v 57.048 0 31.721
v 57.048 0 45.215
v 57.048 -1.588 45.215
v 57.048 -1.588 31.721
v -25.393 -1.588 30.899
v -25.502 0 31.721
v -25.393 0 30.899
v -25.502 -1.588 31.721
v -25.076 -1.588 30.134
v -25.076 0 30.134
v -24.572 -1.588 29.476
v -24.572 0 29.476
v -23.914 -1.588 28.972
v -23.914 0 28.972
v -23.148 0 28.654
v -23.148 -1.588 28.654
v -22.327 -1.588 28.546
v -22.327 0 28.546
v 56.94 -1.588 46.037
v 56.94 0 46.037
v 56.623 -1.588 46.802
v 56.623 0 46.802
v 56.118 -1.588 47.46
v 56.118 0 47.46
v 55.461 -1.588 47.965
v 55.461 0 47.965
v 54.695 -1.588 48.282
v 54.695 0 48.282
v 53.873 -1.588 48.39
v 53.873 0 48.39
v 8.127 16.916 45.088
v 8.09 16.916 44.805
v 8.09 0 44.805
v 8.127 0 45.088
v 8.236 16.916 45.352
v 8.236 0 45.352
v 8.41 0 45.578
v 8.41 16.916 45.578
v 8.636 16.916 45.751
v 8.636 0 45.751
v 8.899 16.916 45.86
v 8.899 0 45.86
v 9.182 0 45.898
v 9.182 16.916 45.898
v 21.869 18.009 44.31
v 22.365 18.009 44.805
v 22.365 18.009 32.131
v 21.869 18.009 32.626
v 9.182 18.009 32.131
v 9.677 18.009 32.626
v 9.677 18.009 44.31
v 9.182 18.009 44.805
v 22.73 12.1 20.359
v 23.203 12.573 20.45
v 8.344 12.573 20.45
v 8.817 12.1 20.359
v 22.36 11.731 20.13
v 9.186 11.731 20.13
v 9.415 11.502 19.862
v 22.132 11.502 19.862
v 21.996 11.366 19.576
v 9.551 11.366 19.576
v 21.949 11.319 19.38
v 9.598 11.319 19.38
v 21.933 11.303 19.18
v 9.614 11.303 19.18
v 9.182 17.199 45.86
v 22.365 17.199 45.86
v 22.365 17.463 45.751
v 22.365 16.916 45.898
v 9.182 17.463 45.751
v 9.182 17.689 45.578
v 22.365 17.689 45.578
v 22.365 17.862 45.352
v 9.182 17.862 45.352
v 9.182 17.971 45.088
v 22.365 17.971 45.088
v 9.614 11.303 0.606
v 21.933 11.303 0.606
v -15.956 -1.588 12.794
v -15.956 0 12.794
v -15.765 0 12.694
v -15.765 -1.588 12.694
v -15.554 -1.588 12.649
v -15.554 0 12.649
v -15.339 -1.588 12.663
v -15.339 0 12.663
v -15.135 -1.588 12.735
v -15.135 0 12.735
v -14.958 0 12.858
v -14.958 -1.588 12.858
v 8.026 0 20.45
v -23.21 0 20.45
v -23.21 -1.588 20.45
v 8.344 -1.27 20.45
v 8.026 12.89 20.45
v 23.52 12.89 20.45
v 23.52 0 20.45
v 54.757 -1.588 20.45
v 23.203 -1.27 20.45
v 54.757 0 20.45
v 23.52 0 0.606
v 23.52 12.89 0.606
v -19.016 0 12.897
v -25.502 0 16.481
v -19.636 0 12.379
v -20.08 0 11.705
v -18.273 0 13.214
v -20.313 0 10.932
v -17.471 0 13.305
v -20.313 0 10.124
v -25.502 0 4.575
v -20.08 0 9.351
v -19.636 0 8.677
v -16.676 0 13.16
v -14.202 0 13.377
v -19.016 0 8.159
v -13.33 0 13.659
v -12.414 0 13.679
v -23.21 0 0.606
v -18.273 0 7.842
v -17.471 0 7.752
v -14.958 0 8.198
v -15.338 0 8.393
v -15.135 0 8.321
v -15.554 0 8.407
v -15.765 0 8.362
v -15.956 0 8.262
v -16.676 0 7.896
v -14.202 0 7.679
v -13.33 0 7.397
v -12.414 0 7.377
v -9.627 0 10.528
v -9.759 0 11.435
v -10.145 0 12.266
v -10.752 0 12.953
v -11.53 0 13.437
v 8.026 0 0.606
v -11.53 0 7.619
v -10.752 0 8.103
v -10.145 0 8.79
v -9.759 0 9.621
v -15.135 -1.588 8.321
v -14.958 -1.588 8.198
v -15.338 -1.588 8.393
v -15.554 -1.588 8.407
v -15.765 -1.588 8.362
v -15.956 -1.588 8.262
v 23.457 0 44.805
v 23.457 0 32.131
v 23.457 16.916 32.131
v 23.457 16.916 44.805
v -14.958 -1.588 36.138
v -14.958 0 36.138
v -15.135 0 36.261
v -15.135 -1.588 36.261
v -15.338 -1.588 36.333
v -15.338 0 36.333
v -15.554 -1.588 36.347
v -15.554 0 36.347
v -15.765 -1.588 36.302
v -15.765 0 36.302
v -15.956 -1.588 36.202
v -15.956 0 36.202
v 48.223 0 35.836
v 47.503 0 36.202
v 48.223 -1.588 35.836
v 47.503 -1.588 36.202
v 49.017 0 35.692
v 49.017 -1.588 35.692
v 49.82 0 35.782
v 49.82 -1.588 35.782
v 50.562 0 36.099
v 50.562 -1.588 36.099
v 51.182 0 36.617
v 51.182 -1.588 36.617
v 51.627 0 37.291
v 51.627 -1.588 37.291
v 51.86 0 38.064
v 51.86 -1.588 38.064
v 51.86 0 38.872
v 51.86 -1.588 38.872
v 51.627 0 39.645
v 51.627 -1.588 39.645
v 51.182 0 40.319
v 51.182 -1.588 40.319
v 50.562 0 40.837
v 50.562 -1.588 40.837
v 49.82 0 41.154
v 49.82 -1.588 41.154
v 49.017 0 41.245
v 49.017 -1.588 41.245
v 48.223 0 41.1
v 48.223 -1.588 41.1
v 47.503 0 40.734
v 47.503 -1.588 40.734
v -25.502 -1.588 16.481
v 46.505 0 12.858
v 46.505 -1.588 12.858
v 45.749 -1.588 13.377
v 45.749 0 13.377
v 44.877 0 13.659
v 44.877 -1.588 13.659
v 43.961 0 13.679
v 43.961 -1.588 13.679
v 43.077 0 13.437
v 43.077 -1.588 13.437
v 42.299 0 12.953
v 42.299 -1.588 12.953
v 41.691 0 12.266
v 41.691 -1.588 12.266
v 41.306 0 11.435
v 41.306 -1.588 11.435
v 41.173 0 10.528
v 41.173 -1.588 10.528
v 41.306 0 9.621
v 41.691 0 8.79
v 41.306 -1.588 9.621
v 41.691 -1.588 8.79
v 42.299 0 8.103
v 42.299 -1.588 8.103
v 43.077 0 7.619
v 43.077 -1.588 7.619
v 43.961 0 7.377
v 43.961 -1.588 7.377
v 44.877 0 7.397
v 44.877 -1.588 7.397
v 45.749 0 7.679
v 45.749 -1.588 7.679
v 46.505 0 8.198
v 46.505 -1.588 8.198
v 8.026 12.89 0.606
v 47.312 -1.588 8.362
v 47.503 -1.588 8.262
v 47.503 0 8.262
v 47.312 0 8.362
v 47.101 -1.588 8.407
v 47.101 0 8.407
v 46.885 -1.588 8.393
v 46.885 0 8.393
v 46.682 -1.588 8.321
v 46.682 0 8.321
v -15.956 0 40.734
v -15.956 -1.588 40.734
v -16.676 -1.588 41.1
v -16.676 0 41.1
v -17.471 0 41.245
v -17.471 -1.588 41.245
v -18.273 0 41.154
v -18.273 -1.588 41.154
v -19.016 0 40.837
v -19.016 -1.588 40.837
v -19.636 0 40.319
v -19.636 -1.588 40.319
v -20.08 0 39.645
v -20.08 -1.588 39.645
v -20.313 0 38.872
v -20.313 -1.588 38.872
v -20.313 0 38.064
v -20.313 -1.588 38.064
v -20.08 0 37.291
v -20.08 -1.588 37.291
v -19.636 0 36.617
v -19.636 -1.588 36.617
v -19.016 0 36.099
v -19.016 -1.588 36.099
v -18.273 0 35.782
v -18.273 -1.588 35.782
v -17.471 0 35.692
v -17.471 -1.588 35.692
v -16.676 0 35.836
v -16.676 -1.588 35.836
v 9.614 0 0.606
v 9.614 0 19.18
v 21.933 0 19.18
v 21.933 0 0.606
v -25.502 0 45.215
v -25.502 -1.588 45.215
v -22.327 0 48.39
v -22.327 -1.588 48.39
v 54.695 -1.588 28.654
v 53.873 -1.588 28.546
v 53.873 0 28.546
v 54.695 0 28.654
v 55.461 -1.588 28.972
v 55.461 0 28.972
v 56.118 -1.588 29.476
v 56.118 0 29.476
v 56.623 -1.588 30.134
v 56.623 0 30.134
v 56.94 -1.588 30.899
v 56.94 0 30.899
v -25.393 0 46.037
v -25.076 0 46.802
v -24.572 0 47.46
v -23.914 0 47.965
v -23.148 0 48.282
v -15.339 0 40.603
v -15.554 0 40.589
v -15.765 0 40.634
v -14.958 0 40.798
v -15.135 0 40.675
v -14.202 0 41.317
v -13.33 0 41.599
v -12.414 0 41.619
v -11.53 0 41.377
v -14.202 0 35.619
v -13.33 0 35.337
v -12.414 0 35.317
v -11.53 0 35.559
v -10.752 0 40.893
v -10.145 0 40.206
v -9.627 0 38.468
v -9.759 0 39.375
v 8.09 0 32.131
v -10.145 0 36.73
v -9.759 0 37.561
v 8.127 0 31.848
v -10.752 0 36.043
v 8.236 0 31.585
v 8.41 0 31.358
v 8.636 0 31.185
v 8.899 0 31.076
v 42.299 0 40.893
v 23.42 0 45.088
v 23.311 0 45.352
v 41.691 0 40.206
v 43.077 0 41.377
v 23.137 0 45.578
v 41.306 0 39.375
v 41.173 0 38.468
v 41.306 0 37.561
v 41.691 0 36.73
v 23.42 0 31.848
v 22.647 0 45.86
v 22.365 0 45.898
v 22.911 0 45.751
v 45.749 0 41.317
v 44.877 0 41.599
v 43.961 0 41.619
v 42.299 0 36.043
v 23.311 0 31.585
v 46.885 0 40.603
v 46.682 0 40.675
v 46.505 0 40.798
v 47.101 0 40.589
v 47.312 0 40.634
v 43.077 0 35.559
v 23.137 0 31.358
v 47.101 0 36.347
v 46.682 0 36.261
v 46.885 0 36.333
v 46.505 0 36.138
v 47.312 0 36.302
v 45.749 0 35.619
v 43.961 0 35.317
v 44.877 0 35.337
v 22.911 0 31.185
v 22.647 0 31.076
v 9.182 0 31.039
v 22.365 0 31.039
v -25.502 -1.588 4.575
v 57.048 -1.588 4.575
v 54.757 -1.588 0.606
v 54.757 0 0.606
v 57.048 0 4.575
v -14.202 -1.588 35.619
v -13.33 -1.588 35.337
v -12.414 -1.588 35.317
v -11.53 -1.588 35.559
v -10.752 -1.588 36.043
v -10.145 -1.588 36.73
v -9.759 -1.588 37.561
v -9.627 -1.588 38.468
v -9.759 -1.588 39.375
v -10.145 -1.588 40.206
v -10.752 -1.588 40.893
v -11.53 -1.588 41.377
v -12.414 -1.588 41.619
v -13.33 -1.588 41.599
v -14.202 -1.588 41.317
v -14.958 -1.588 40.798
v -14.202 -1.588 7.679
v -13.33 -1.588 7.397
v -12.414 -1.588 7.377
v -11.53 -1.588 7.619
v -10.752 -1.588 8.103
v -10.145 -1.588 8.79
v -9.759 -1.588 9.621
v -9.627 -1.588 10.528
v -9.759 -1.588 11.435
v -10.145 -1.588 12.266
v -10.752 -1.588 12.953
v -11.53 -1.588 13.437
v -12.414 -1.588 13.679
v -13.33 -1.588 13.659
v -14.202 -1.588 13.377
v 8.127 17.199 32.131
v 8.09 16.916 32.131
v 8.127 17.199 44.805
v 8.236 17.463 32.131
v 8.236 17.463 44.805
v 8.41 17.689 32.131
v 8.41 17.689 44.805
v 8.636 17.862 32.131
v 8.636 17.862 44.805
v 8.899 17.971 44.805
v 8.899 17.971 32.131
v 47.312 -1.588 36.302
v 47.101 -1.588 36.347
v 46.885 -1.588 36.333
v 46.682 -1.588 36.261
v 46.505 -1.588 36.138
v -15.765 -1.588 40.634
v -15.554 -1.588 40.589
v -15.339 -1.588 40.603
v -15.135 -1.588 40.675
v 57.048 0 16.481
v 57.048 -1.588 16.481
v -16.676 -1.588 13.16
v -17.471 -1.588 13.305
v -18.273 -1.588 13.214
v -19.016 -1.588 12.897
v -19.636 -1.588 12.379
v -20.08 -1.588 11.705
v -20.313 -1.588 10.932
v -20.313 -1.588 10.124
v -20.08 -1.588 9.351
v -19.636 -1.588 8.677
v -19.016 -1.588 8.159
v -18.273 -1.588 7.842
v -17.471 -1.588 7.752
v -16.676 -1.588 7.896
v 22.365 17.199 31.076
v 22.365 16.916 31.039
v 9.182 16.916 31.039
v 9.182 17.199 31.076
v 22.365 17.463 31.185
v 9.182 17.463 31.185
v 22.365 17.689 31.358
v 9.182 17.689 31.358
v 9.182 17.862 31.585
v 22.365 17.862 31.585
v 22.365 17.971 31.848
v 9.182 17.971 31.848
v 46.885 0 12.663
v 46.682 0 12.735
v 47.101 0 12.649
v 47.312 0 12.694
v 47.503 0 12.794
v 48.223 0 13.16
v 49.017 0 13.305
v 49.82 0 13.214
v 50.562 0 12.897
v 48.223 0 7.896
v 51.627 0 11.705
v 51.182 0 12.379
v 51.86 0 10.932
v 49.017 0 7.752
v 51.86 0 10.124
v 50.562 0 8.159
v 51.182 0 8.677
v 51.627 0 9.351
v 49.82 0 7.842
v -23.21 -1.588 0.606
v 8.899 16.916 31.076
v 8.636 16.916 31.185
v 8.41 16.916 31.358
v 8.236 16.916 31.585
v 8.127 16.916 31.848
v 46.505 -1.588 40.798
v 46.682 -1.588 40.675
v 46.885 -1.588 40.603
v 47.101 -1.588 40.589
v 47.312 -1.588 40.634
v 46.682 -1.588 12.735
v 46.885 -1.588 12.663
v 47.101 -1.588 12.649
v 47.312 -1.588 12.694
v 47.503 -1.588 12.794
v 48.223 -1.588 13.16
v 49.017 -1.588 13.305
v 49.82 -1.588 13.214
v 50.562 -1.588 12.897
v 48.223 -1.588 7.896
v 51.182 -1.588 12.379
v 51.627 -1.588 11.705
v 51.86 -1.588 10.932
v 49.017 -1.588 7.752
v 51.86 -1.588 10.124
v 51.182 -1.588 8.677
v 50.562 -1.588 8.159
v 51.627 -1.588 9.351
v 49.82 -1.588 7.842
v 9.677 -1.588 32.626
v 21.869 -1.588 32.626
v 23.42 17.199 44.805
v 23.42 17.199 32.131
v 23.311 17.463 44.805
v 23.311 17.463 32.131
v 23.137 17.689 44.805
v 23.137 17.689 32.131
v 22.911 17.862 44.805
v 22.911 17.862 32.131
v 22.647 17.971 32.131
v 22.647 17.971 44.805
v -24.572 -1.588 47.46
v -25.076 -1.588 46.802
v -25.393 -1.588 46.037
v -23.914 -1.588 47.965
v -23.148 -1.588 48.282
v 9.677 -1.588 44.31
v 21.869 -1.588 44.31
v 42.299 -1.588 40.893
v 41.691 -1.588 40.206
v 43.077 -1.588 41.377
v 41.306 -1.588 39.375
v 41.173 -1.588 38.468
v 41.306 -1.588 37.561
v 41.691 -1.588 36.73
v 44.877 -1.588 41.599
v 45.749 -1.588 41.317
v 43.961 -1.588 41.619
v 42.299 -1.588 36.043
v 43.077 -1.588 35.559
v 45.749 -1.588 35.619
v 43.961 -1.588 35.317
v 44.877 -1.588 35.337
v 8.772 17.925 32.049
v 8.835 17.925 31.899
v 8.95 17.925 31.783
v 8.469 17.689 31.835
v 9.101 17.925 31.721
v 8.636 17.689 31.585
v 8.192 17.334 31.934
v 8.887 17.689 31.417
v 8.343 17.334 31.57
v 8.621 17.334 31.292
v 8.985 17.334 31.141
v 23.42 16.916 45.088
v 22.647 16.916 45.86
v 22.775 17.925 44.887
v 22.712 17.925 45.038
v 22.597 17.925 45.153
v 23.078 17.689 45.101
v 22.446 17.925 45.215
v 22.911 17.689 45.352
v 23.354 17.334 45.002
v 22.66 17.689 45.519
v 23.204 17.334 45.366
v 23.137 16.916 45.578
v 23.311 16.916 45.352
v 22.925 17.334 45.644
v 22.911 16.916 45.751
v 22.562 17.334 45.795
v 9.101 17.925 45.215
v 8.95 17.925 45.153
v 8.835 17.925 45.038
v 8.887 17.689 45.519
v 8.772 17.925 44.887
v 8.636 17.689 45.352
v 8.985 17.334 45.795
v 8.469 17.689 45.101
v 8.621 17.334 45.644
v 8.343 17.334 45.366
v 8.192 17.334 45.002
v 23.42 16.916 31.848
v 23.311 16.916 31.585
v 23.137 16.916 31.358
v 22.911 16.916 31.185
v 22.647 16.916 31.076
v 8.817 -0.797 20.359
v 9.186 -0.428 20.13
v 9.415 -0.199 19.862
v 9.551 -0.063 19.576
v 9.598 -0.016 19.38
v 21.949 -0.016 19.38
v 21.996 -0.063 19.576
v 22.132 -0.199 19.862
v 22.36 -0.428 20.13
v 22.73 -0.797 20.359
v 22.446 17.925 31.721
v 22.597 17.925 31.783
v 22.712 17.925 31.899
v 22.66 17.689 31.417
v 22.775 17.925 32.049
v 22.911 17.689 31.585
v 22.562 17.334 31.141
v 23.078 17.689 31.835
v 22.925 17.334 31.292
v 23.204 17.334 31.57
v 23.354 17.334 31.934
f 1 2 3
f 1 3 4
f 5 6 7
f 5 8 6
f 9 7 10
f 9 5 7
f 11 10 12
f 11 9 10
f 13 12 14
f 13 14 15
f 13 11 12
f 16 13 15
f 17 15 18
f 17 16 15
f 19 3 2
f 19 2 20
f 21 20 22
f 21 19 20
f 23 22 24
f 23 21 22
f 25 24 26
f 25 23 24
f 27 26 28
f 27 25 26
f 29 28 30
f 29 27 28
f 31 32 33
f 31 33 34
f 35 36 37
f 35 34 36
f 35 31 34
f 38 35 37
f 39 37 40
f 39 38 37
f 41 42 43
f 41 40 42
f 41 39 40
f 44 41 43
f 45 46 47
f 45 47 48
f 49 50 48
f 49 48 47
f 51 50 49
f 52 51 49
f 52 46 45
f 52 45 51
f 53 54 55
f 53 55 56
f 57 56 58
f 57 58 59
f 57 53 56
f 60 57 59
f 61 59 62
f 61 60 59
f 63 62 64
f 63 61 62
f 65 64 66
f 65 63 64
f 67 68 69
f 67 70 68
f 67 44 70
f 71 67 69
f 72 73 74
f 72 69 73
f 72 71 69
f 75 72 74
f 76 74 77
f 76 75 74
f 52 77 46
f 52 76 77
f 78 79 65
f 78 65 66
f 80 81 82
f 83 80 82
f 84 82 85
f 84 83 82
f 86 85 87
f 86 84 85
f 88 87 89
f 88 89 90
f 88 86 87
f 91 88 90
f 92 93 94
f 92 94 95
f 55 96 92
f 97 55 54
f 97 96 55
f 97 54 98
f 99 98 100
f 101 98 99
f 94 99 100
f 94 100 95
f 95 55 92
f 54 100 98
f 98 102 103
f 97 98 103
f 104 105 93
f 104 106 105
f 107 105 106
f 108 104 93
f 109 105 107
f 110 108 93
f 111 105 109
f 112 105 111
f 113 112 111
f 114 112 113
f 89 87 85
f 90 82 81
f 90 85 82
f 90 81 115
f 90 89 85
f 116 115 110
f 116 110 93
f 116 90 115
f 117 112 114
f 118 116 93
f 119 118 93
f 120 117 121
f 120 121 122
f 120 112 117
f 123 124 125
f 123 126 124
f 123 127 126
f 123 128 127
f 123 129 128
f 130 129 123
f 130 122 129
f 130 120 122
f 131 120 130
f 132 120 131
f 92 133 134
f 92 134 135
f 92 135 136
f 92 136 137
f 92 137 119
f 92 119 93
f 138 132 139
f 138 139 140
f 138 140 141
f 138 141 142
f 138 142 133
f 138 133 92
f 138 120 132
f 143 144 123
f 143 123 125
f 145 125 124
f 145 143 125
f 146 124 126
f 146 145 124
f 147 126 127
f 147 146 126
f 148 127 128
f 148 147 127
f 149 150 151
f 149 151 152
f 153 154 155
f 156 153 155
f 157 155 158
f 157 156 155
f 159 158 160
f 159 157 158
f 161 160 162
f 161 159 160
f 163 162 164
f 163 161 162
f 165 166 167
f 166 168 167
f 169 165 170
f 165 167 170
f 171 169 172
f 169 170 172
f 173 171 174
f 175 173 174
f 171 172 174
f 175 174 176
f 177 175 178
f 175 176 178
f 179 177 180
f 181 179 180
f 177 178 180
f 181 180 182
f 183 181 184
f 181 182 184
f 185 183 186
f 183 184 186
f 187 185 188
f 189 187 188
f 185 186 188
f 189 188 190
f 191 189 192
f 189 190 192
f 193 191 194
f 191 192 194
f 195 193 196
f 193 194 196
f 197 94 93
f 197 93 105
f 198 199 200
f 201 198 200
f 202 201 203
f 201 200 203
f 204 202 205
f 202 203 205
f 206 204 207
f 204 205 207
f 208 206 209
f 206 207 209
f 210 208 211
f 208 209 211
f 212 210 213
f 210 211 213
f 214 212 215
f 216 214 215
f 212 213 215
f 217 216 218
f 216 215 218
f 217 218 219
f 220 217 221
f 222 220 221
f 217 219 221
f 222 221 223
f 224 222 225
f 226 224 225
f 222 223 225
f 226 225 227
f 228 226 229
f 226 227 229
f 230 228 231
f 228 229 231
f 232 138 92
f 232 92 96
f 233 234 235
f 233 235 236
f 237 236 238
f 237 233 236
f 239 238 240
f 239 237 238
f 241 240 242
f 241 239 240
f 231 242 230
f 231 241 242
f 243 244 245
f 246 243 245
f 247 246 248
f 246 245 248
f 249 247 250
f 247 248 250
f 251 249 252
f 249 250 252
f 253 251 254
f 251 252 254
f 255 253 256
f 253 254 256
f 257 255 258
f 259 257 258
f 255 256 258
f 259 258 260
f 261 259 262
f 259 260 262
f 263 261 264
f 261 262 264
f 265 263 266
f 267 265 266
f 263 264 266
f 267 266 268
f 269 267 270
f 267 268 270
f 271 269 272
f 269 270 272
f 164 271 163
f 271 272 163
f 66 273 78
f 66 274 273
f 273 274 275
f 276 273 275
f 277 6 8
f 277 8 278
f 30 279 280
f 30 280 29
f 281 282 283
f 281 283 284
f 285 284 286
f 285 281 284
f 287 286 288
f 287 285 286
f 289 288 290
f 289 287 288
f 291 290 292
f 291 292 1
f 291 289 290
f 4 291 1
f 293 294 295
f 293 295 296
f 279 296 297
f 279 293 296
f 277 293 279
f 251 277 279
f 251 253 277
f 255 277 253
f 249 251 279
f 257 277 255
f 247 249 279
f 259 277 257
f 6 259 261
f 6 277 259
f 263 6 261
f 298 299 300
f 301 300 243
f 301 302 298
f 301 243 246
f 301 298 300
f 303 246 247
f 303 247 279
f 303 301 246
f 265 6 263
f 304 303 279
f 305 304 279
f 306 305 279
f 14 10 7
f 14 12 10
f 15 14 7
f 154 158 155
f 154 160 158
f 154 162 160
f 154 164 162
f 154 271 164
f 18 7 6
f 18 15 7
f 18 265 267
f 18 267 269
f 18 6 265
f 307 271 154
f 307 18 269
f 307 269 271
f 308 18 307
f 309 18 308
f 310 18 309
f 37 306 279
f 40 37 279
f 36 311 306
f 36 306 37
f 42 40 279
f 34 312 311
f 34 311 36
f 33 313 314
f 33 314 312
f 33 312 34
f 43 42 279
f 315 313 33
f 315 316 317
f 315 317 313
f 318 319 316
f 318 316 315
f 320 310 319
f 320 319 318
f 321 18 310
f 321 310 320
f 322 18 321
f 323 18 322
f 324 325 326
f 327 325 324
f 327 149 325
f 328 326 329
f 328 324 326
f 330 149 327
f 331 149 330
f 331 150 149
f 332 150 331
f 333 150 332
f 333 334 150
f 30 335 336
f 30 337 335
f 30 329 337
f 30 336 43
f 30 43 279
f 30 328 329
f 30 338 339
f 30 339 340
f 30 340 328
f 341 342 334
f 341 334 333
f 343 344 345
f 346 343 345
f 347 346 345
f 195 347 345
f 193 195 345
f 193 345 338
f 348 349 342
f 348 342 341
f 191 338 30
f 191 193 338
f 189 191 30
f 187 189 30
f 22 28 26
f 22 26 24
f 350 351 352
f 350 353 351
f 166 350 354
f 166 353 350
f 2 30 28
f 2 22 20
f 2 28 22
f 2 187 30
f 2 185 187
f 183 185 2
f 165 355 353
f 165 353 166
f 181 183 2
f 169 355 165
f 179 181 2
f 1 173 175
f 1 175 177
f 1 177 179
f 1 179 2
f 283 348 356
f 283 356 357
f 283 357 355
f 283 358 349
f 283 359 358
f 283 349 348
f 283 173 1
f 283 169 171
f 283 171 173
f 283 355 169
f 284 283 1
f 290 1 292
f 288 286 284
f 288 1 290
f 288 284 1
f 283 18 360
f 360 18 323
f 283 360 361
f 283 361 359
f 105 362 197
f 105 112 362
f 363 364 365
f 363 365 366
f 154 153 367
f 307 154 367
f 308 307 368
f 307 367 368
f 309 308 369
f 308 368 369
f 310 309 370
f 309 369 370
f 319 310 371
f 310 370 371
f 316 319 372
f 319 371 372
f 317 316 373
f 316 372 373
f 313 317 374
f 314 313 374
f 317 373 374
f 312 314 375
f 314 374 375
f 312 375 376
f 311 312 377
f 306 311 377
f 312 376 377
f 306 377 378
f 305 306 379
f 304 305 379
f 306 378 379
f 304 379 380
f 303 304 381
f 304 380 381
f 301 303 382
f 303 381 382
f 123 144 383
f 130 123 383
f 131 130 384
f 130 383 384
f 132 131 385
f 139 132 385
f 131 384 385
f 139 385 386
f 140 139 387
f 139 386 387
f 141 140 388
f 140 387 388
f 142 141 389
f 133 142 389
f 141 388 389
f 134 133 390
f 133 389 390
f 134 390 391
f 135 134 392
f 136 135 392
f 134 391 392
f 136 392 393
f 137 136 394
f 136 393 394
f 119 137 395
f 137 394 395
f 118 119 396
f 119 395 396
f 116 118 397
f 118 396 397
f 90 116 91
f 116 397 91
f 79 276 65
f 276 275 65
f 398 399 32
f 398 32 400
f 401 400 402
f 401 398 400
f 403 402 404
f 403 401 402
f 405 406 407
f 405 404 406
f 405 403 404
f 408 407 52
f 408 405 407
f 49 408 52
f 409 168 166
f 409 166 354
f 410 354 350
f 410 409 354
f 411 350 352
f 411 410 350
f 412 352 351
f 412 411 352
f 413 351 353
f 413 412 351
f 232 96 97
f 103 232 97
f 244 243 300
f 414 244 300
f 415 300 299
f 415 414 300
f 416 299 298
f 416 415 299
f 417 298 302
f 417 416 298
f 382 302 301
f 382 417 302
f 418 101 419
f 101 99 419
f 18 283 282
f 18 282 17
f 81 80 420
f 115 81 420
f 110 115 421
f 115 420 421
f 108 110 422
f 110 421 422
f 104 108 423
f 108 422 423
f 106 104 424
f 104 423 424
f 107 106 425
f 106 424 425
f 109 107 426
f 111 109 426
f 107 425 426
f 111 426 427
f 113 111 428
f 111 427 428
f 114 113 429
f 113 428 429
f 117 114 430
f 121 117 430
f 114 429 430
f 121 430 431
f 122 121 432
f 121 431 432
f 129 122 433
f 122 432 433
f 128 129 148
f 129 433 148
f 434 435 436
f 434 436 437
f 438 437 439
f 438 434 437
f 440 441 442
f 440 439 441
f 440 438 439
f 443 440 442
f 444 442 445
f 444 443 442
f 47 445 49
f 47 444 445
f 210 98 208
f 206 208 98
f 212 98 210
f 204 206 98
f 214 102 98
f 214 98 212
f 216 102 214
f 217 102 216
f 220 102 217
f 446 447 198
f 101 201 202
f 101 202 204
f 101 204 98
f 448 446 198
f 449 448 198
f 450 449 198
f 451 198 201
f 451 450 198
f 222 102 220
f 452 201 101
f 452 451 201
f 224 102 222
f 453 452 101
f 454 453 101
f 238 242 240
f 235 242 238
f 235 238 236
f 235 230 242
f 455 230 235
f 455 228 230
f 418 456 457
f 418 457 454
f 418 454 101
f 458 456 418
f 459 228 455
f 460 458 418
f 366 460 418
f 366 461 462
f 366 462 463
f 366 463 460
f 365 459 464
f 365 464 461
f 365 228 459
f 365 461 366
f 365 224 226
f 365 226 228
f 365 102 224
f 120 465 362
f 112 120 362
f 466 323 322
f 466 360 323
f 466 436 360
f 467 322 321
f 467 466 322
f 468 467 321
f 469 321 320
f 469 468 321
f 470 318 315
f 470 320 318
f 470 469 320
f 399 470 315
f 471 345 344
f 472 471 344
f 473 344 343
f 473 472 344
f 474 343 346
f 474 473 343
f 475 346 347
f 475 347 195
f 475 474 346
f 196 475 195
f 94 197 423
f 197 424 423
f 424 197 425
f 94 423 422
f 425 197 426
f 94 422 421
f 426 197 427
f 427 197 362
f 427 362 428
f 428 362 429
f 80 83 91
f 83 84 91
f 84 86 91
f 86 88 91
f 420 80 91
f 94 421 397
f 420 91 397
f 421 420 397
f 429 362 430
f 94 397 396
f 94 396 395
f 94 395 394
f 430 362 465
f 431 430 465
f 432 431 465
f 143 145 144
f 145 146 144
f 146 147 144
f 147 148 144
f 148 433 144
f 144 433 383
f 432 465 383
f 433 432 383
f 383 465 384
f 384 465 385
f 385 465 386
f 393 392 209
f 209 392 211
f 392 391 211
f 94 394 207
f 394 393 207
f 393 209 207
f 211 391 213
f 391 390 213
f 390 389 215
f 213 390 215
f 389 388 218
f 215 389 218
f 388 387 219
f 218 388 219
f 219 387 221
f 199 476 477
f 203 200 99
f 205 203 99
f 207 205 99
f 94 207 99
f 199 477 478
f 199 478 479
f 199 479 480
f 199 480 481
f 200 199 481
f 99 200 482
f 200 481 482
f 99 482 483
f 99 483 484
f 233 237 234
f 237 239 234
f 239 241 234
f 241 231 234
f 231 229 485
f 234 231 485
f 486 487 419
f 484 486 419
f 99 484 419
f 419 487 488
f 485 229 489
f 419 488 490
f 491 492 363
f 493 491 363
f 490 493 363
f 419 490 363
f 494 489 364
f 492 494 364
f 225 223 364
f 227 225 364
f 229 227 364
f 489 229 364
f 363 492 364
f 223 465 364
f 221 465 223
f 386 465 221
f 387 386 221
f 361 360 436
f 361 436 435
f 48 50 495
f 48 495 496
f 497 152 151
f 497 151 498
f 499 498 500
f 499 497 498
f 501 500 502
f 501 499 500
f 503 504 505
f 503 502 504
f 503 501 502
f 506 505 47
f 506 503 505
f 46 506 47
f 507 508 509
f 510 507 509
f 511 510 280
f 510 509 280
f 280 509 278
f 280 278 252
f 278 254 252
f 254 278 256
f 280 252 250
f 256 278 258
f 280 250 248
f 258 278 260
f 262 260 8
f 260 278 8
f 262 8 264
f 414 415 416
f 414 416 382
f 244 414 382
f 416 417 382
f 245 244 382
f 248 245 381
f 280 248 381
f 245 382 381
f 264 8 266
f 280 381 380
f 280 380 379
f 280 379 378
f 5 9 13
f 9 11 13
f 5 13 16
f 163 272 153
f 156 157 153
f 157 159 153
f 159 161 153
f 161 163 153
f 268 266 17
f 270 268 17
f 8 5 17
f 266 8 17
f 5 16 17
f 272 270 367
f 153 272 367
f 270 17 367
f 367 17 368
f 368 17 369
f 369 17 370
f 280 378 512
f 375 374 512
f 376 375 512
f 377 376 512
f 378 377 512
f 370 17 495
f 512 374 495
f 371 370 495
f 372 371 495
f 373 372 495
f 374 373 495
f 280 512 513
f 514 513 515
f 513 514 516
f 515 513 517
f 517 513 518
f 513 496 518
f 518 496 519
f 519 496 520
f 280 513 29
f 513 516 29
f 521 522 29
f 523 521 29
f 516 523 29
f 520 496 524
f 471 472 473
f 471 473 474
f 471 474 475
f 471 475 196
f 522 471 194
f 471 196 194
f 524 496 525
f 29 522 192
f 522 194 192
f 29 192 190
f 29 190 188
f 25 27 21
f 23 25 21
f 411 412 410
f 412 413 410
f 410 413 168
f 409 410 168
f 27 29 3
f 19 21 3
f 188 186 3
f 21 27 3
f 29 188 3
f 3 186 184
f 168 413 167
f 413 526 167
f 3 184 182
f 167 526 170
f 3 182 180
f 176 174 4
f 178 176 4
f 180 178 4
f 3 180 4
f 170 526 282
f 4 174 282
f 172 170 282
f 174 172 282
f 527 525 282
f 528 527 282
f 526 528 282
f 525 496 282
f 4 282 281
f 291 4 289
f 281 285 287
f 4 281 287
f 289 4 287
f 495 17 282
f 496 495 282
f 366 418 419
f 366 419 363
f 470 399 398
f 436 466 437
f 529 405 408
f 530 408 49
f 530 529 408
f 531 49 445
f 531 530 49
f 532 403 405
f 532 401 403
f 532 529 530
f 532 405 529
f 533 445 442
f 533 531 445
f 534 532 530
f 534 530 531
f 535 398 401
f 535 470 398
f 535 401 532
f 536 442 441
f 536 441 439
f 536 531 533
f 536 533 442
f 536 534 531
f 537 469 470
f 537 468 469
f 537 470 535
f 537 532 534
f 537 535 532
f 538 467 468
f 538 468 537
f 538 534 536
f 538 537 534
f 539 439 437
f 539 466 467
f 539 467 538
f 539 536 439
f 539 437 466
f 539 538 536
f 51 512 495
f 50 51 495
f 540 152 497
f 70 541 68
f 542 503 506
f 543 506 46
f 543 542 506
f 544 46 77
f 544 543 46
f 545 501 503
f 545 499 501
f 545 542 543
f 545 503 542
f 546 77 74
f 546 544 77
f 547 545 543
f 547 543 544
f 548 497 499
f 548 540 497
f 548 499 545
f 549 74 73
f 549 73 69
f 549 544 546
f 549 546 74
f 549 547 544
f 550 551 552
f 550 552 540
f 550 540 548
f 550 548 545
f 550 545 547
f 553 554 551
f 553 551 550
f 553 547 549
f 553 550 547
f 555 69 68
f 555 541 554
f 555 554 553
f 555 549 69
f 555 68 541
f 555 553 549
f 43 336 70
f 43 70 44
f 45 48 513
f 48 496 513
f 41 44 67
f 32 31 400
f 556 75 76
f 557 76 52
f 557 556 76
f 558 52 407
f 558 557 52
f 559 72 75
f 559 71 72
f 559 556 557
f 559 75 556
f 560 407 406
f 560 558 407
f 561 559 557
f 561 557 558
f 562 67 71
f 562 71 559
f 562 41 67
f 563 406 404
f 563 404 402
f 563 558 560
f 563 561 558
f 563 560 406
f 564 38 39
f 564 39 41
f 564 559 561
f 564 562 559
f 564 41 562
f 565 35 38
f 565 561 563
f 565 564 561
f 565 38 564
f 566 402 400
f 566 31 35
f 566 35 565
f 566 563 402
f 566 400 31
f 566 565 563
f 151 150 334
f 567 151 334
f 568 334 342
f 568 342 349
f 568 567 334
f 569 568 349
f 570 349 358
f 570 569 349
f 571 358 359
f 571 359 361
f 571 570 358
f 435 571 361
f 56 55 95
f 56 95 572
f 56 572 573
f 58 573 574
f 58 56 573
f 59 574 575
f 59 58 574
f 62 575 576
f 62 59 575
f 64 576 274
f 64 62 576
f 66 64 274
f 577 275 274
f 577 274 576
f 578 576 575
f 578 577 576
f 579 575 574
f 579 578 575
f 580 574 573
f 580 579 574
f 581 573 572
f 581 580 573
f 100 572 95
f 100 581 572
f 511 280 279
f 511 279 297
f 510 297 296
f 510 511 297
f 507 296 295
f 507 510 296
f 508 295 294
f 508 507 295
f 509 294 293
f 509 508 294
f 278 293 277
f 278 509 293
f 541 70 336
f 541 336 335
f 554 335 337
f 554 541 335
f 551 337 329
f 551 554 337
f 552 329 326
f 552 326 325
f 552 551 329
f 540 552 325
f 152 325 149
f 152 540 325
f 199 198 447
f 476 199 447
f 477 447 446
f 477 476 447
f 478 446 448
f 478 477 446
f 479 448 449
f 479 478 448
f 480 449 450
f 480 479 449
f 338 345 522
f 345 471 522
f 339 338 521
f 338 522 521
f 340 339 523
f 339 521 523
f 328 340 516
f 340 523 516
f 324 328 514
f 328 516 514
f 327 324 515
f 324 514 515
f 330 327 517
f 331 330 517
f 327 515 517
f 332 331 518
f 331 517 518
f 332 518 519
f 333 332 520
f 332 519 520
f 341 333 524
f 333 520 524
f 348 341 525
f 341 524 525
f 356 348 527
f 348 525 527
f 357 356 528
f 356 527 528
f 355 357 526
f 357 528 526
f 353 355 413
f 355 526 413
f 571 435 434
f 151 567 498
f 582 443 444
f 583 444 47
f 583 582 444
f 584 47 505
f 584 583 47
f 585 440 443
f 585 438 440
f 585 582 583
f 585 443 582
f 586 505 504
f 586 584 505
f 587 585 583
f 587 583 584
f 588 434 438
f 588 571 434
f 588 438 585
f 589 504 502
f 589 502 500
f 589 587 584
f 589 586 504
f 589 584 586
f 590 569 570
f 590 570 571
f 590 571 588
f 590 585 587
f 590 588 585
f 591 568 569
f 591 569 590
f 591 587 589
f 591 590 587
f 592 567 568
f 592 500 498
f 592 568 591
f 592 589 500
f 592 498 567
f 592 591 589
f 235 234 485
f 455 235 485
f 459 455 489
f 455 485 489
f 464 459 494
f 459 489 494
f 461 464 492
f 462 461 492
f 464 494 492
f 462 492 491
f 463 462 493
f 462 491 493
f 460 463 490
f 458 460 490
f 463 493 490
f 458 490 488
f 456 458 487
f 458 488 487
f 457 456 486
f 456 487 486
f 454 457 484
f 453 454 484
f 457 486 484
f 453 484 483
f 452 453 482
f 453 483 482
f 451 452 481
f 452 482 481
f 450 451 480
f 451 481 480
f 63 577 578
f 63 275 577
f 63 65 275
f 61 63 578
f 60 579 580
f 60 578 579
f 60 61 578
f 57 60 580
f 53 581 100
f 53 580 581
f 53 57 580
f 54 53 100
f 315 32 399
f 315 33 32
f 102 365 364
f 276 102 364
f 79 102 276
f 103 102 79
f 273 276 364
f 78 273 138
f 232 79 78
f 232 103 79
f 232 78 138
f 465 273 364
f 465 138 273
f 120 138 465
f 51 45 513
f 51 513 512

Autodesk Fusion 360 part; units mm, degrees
sketch "Sketch1" plane through (0, 0, 0) normal (0, 1, 0) x (1, 0, 0) in component "Solenoid base"
  line L0 (-25.5016, -20.45) -> (57.0484, -20.45)
  line L1 (57.0484, -20.45) -> (57.0484, -0.6062)
  line L2 (57.0484, -0.6062) -> (-25.5016, -0.6062)
  line L3 (-25.5016, -0.6062) -> (-25.5016, -20.45)
  dimension "d1_1_1" = 82.55
  dimension "d2_1_1" = 19.8438
extrude "Extrude1" add sketch "Sketch1" against normal blind 1.5875 makes body 1 in component "Solenoid base"
sketch "Sketch5" plane through (0, -1.5875, 0) normal (0, -1, 0) x (1, 0, 0) in component "Solenoid base"
  line L0 (15.7734, -11.3) -> (15.7734, 20.45) construction
  line L1 (46.9483, 10.5281) -> (-16.5517, 10.5281) construction
  line L2 (44.3484, 10.5281) -> (49.1109, 10.5281) construction
  arc A0 (47.5032, 8.2625) -> (46.5048, 8.1977) centre (47.0438, 7.6151) ccw
  arc A1 (46.5048, 12.8585) -> (47.5032, 12.7938) centre (47.0438, 13.4411) ccw
  arc A2 (47.5032, 8.2625) -> (47.5032, 12.7938) centre (49.1109, 10.5281) ccw
  arc A3 (46.5048, 12.8585) -> (46.5048, 8.1977) centre (44.3484, 10.5281) ccw
  arc A4 (-14.958, 8.1977) -> (-14.958, 12.8585) centre (-12.8016, 10.5281) ccw
  arc A5 (-15.9564, 12.7938) -> (-15.9564, 8.2625) centre (-17.5641, 10.5281) ccw
  arc A6 (-15.9564, 12.7938) -> (-14.958, 12.8585) centre (-15.497, 13.4411) ccw
  arc A7 (-14.958, 8.1977) -> (-15.9564, 8.2625) centre (-15.497, 7.6151) ccw
  line L3 (49.1109, 10.5281) -> (-12.8016, 10.5281) construction
  line L4 (57.0484, 10.5281) -> (-25.5016, 10.5281) construction
  line L5 (57.0484, 20.45) -> (-25.5016, 20.45)
  line L6 (-25.5016, 20.45) -> (-25.5016, 0.6062)
  line L7 (-25.5016, 0.6062) -> (57.0484, 0.6062)
  line L8 (57.0484, 0.6062) -> (57.0484, 20.45)
  dimension "d33_1_1" = 5.5563
  dimension "d35_1_1" = 1.5875
  dimension "d38_1_1" = 4.7625
  dimension "d40_1_1" = 3.175
  dimension "d2" = 28.575
extrude "Extrude12" cut sketch "Sketch5" against normal up to surface (1.5875 mm away) contours A0 A1 A2 A3 | A4 A5 A6 A7 bodies 1 in component "Solenoid base"
sketch "Sketch17" plane through (0, 0, 20.45) normal (0, 0, 1) x (1, 0, 0) in component "Solenoid base"
  line L0 (57.0484, 0) -> (-25.5016, 0)
  line L1 (-25.5016, -1.5875) -> (57.0484, -1.5875)
  line L2 (15.7734, 0) -> (15.7734, 14.8694) construction
  line L3 (15.7734, 0) -> (21.9329, 0)
  line L4 (21.9329, 0) -> (21.9329, 11.303)
  line L5 (21.9329, 11.303) -> (15.7734, 11.303)
  line L6 (9.6139, 0) -> (9.6139, 11.303)
  line L7 (9.6139, 11.303) -> (15.7734, 11.303)
  line L8 (8.0264, 0) -> (8.0264, 12.8905)
  line L9 (8.0264, 12.8905) -> (15.7734, 12.8905)
  line L10 (23.5204, 12.8905) -> (15.7734, 12.8905)
  line L11 (23.5204, -1.5875) -> (23.5204, 12.8905)
  line L12 (15.7734, -1.5875) -> (23.5204, -1.5875)
  line L13 (-25.5016, 0) -> (-25.5016, -1.5875)
  line L14 (57.0484, -1.5875) -> (57.0484, 0)
  dimension "d5" = 11.303
  dimension "d6" = 6.1595
  dimension "d7" = 1.5875
extrude "Extrude13" add sketch "Sketch17" against normal up to surface (19.8438 mm away) contours L0 L4 L5 L6 L7 L8 L9 L10 L11 bodies 1 in component "Solenoid base"
sketch "Sketch1 (2)" plane through (0, 0, 0) normal (0, 1, 0) x (1, 0, 0) in component "Solenoid base vertical"
  line L0 (-25.5016, -20.45) -> (57.0484, -20.45)
  line L1 (57.0484, -20.45) -> (57.0484, -0.6062)
  line L2 (57.0484, -0.6062) -> (-25.5016, -0.6062)
  line L3 (-25.5016, -0.6062) -> (-25.5016, -20.45)
  dimension "d1_1_1_1" = 82.55
  dimension "d2_1_1_1" = 19.8438
extrude "Extrude1'" add sketch "Sketch1 (2)" against normal blind 1.5875 separate body makes body 2 in component "Solenoid base vertical"
sketch "Sketch5 (2)" plane through (0, -1.5875, 0) normal (0, -1, 0) x (1, 0, 0) in component "Solenoid base vertical"
  line L0 (15.7734, -11.3) -> (15.7734, 20.45) construction
  line L1 (46.9483, 10.5281) -> (-16.5517, 10.5281) construction
  line L2 (44.3484, 10.5281) -> (49.1109, 10.5281) construction
  arc A0 (47.5032, 8.2625) -> (46.5048, 8.1977) centre (47.0438, 7.6151) ccw
  arc A1 (46.5048, 12.8585) -> (47.5032, 12.7938) centre (47.0438, 13.4411) ccw
  arc A2 (47.5032, 8.2625) -> (47.5032, 12.7938) centre (49.1109, 10.5281) ccw
  arc A3 (46.5048, 12.8585) -> (46.5048, 8.1977) centre (44.3484, 10.5281) ccw
  arc A4 (-14.958, 8.1977) -> (-14.958, 12.8585) centre (-12.8016, 10.5281) ccw
  arc A5 (-15.9564, 12.7938) -> (-15.9564, 8.2625) centre (-17.5641, 10.5281) ccw
  arc A6 (-15.9564, 12.7938) -> (-14.958, 12.8585) centre (-15.497, 13.4411) ccw
  arc A7 (-14.958, 8.1977) -> (-15.9564, 8.2625) centre (-15.497, 7.6151) ccw
  line L3 (49.1109, 10.5281) -> (-12.8016, 10.5281) construction
  line L4 (57.0484, 10.5281) -> (-25.5016, 10.5281) construction
  line L5 (57.0484, 20.45) -> (-25.5016, 20.45)
  line L6 (-25.5016, 20.45) -> (-25.5016, 0.6062)
  line L7 (-25.5016, 0.6062) -> (57.0484, 0.6062)
  line L8 (57.0484, 0.6062) -> (57.0484, 20.45)
  dimension "d33_1_1_1" = 5.5563
  dimension "d35_1_1_1" = 1.5875
  dimension "d38_1_1_1" = 4.7625
  dimension "d40_1_1_1" = 3.175
  dimension "d2_2" = 28.575
extrude "Extrude12'" cut sketch "Sketch5 (2)" against normal up to surface (1.5875 mm away) contours A0 A1 A2 A3 | A4 A5 A6 A7 bodies 2 in component "Solenoid base vertical"
sketch "Sketch17 (2)" plane through (0, 0, 20.45) normal (0, 0, 1) x (1, 0, 0) in component "Solenoid base vertical"
  line L0 (57.0484, 0) -> (-25.5016, 0)
  line L1 (-25.5016, -1.5875) -> (57.0484, -1.5875)
  line L2 (15.7734, 0) -> (15.7734, 14.8694) construction
  line L3 (15.7734, 0) -> (22.9172, 0)
  line L4 (22.9172, 0) -> (22.9172, 14.2875)
  line L5 (22.9172, 14.2875) -> (15.7734, 14.2875)
  line L6 (8.6297, 0) -> (8.6297, 14.2875)
  line L7 (8.6297, 14.2875) -> (15.7734, 14.2875)
  line L8 (7.0422, 0) -> (7.0422, 15.875)
  line L9 (7.0422, 15.875) -> (15.7734, 15.875)
  line L10 (24.5047, 15.875) -> (15.7734, 15.875)
  line L11 (24.5047, -1.5875) -> (24.5047, 15.875)
  line L12 (15.7734, -1.5875) -> (24.5047, -1.5875)
  line L13 (-25.5016, 0) -> (-25.5016, -1.5875)
  line L14 (57.0484, -1.5875) -> (57.0484, 0)
  dimension "d5_2" = 14.2875
  dimension "d6_2" = 7.1437
  dimension "d7_2" = 1.5875
sketch "Sketch18" plane through (0, 0, 0) normal (0, 1, 0) x (-1, 0, 0) in component "Solenoid base vertical"
  arc A0 (-46.5048, 8.1977) -> (-47.5032, 8.2625) centre (-47.0438, 7.6151) ccw
  arc A1 (-47.5032, 12.7938) -> (-47.5032, 8.2625) centre (-49.1109, 10.5281) ccw
  arc A2 (-47.5032, 12.7938) -> (-46.5048, 12.8585) centre (-47.0438, 13.4411) ccw
  arc A3 (-46.5048, 8.1977) -> (-46.5048, 12.8585) centre (-44.3484, 10.5281) ccw
  arc A4 (14.958, 12.8585) -> (15.9564, 12.7938) centre (15.497, 13.4411) ccw
  arc A5 (15.9564, 8.2625) -> (15.9564, 12.7938) centre (17.5641, 10.5281) ccw
  arc A6 (15.9564, 8.2625) -> (14.958, 8.1977) centre (15.497, 7.6151) ccw
  arc A7 (14.958, 12.8585) -> (14.958, 8.1977) centre (12.8016, 10.5281) ccw
  line L0 (25.5016, 0.6062) -> (25.5016, 20.45)
  line L1 (25.5016, 20.45) -> (-57.0484, 20.45)
  line L2 (-57.0484, 20.45) -> (-57.0484, 0.6062)
  line L3 (-57.0484, 0.6062) -> (25.5016, 0.6062)
  line L4 (-15.7734, 0.6062) -> (-15.7734, 20.45) construction
  line L5 (-8.6297, 0.6062) -> (-22.9172, 0.6062)
  line L6 (-21.8694, 4.6861) -> (-21.8694, 16.3701)
  line L7 (-22.9172, 20.45) -> (-8.6297, 20.45)
  line L8 (-9.6774, 16.3701) -> (-9.6774, 4.6861)
  line L9 (-9.6774, 4.6861) -> (-21.8694, 4.6861)
  line L10 (-21.8694, 10.5281) -> (-21.8694, 16.3701)
  line L11 (-21.8694, 16.3701) -> (-9.6774, 16.3701)
  line L12 (-9.6774, 10.5281) -> (-9.6774, 4.6861)
  line L13 (-9.6774, 10.5281) -> (-27.6863, 10.5281) construction
  line L14 (25.5016, 10.5281) -> (-3.8857, 10.5281) construction
  dimension "d10" = 6.096
  dimension "d11" = 12.192
  dimension "d12" = 11.684
  dimension "d14" = 5.842
extrude "Extrude14" cut sketch "Sketch18" against normal up to surface (1.5875 mm away) contours L6 L8 L9 L10 L11 L12 bodies 2 in component "Solenoid base vertical"
sketch "Sketch19" plane through (0, 0, 0) normal (0, 1, 0) x (-1, 0, 0) in component "Solenoid base vertical"
  line L0 (-9.6774, 4.6861) -> (-21.8694, 4.6861)
  line L1 (-21.8694, 4.6861) -> (-21.8694, 16.3701)
  line L2 (-21.8694, 16.3701) -> (-9.6774, 16.3701)
  line L3 (-9.6774, 16.3701) -> (-9.6774, 4.6861)
  arc A0 (-46.5048, 8.1977) -> (-47.5032, 8.2625) centre (-47.0438, 7.6151) ccw
  arc A1 (-47.5032, 12.7938) -> (-47.5032, 8.2625) centre (-49.1109, 10.5281) ccw
  arc A2 (-47.5032, 12.7938) -> (-46.5048, 12.8585) centre (-47.0438, 13.4411) ccw
  arc A3 (-46.5048, 8.1977) -> (-46.5048, 12.8585) centre (-44.3484, 10.5281) ccw
  arc A4 (14.958, 12.8585) -> (15.9564, 12.7938) centre (15.497, 13.4411) ccw
  arc A5 (15.9564, 8.2625) -> (15.9564, 12.7938) centre (17.5641, 10.5281) ccw
  arc A6 (15.9564, 8.2625) -> (14.958, 8.1977) centre (15.497, 7.6151) ccw
  arc A7 (14.958, 12.8585) -> (14.958, 8.1977) centre (12.8016, 10.5281) ccw
  line L4 (25.5016, 0.6062) -> (25.5016, 20.45)
  line L5 (25.5016, 20.45) -> (-57.0484, 20.45)
  line L6 (-57.0484, 20.45) -> (-57.0484, 0.6062)
  line L7 (-57.0484, 0.6062) -> (25.5016, 0.6062)
  line L8 (-23.4569, 17.9576) -> (-8.0899, 17.9576)
  line L9 (-8.0899, 17.9576) -> (-8.0899, 3.0986)
  line L10 (-8.0899, 3.0986) -> (-23.4569, 3.0986)
  line L11 (-23.4569, 3.0986) -> (-23.4569, 17.9576)
  dimension "d17" = -1.5875
extrude "Extrude15" add sketch "Sketch19" along normal blind 18.0086 contours L8 L9 L10 L11 bodies 2 in component "Solenoid base vertical"
fillet "Fillet9" radius 1.0922 8 edges at (23.4569, 9.0043, 17.9576) (23.4569, 9.0043, 3.0986) (8.0899, 9.0043, 3.0986) (8.0899, 9.0043, 17.9576) (8.0899, 18.0086, 10.5281) (15.7734, 18.0086, 17.9576) (23.4569, 18.0086, 10.5281) (15.7734, 18.0086, 3.0986) on bodies 2 in component "Solenoid base vertical"
fillet "Fillet10" radius 3.175 4 edges at (57.0484, -0.7937, 20.45) (57.0484, -0.7937, 0.6062) (-25.5016, -0.7937, 20.45) (-25.5016, -0.7937, 0.6062) on bodies 2 in component "Solenoid base vertical"
fillet "Fillet9'" radius 1.27 4 edges at (15.7734, 0, 20.45) (9.6139, 5.6515, 20.45) (15.7734, 11.303, 20.45) (21.9329, 5.6515, 20.45) on bodies 1 in component "Solenoid base"
sketch "Sketch18 (2)" plane through (0, -1.5875, 0) normal (0, -1, 0) x (1, 0, 0) in component "Solenoid base"
  arc A0 (47.5032, 8.2625) -> (46.5048, 8.1977) centre (47.0438, 7.6151) ccw
  arc A1 (46.5048, 12.8585) -> (46.5048, 8.1977) centre (44.3484, 10.5281) ccw
  arc A2 (46.5048, 12.8585) -> (47.5032, 12.7938) centre (47.0438, 13.4411) ccw
  arc A3 (47.5032, 8.2625) -> (47.5032, 12.7938) centre (49.1109, 10.5281) ccw
  arc A4 (-15.9564, 12.7938) -> (-14.958, 12.8585) centre (-15.497, 13.4411) ccw
  arc A5 (-14.958, 8.1977) -> (-14.958, 12.8585) centre (-12.8016, 10.5281) ccw
  arc A6 (-14.958, 8.1977) -> (-15.9564, 8.2625) centre (-15.497, 7.6151) ccw
  arc A7 (-15.9564, 12.7938) -> (-15.9564, 8.2625) centre (-17.5641, 10.5281) ccw
  line L0 (-25.5016, 20.45) -> (-25.5016, 0.6062)
  line L1 (-25.5016, 0.6062) -> (57.0484, 0.6062)
  line L2 (57.0484, 0.6062) -> (57.0484, 20.45)
  line L3 (57.0484, 20.45) -> (-25.5016, 20.45)
  line L4 (-23.2102, 20.45) -> (-25.5016, 16.4812)
  line L5 (-23.2102, 20.45) -> (-25.5016, 20.45)
  line L6 (-25.5016, 16.4812) -> (-25.5016, 20.45)
  line L7 (15.7734, 20.45) -> (15.7734, 4.7728) construction
  curve L8
  line L9 (54.757, 20.45) -> (57.0484, 20.45)
  line L10 (54.757, 20.45) -> (57.0484, 16.4812)
  line L11 (57.0484, 16.4812) -> (57.0484, 20.45)
  line L12 (57.0484, 10.5281) -> (23.201, 10.5281) construction
  line L13 (54.757, 0.6062) -> (57.0484, 4.575)
  line L14 (57.0484, 4.575) -> (57.0484, 0.6062)
  line L15 (54.757, 0.6062) -> (57.0484, 0.6062)
  line L16 (-23.2102, 0.6062) -> (-25.5016, 4.575)
  line L17 (-23.2102, 0.6062) -> (-25.5016, 0.6062)
  line L18 (-25.5016, 4.575) -> (-25.5016, 0.6062)
  point P0 (57.0484, 20.45)
  dimension "d23" = 30
  dimension "d24" = 3.9688
extrude "Extrude14'" cut sketch "Sketch18 (2)" against normal up to surface (1.5875 mm away) contours L0 L3 L4 L5 L6 | L0 L1 L16 L17 L18 | L2 L3 L9 L10 L11 | L1 L2 L13 L14 L15 bodies 1 in component "Solenoid base"
component "Solenoid base" placed x (1, 0, 0) y (0, 1, 0) z (0, 0, 1) at (0, 0, 0)
component "Solenoid base vertical" placed x (1, 0, 0) y (0, 1, 0) z (0, 0, 1) at (0, 0, 27.94)
equation "d3_1_1 = d1_1_1 / 2 - 0.246 in"
equation "d4_1_1 = ( d2_1_1 - 0.889764 in ) / 2"
equation "d8_1_1 = 0.25 in"
equation "d10_1_1 = 2.50 in / 2"
equation "d14_1_1 = 0.889764 in / 2 + d16_1_1 / 2"
equation "d30_1_1 = 0.063 in"
equation "d33_1_1 = 0.25 in - 0.03125 in"
equation "d36_1_1 = ( 1.25 in ) / 2 - d32_1"
equation "d41_1_1 = -0.40 in"
equation "d42_1_1 = 0.0 deg"
equation "d66_1 = d65_1"
equation "d67_1 = 0.00 in"
equation "d78_1 = d75_1"
equation "d93_1 = 0.625 in + d75_1 / 2"
equation "d95_1 = 0.1875 in + 0.010 in"
equation "d96_1 = 0.0 deg"
equation "d97_1 = 0.0625 in"
equation "d98_1 = 0.0 deg"
equation "d99_1 = 0.8900 in"
equation "d100_1 = 0.1875 in + 0.01 in"
equation "d101_1 = 0.0 deg"
equation "d102_1 = 0.06250 in"
equation "d103_1 = 0.0 deg"
equation "d104_1 = -0.3125 in"
equation "d105_1 = -10.0 deg"
equation "d106_1 = -0.25 in"
equation "d107_1 = 0.0 deg"
equation "d109_1 = d108_1"
equation "d110_1 = -0.2500 in"
equation "d111_1 = 0.0 deg"
equation "d115_1 = 0.060 in"
equation "d116_1 = 0.030 in"
equation "d117_1 = 0.25 in"
equation "d118_1 = 90.0 deg"
equation "d119_1 = 90.0 deg"
equation "d32_1 = 0.25 in + ( 0.03125 / 2 ) * 1 in"
equation "d6 = ( 0.485 / 2 ) * 1 in"
equation "d33_1_1_1 = 0.25 in - 0.03125 in"
equation "d6_2 = ( 0.5625 / 2 ) * 1 in"
equation "d10 = d11 / 2"
equation "d14 = d12 / 2"
